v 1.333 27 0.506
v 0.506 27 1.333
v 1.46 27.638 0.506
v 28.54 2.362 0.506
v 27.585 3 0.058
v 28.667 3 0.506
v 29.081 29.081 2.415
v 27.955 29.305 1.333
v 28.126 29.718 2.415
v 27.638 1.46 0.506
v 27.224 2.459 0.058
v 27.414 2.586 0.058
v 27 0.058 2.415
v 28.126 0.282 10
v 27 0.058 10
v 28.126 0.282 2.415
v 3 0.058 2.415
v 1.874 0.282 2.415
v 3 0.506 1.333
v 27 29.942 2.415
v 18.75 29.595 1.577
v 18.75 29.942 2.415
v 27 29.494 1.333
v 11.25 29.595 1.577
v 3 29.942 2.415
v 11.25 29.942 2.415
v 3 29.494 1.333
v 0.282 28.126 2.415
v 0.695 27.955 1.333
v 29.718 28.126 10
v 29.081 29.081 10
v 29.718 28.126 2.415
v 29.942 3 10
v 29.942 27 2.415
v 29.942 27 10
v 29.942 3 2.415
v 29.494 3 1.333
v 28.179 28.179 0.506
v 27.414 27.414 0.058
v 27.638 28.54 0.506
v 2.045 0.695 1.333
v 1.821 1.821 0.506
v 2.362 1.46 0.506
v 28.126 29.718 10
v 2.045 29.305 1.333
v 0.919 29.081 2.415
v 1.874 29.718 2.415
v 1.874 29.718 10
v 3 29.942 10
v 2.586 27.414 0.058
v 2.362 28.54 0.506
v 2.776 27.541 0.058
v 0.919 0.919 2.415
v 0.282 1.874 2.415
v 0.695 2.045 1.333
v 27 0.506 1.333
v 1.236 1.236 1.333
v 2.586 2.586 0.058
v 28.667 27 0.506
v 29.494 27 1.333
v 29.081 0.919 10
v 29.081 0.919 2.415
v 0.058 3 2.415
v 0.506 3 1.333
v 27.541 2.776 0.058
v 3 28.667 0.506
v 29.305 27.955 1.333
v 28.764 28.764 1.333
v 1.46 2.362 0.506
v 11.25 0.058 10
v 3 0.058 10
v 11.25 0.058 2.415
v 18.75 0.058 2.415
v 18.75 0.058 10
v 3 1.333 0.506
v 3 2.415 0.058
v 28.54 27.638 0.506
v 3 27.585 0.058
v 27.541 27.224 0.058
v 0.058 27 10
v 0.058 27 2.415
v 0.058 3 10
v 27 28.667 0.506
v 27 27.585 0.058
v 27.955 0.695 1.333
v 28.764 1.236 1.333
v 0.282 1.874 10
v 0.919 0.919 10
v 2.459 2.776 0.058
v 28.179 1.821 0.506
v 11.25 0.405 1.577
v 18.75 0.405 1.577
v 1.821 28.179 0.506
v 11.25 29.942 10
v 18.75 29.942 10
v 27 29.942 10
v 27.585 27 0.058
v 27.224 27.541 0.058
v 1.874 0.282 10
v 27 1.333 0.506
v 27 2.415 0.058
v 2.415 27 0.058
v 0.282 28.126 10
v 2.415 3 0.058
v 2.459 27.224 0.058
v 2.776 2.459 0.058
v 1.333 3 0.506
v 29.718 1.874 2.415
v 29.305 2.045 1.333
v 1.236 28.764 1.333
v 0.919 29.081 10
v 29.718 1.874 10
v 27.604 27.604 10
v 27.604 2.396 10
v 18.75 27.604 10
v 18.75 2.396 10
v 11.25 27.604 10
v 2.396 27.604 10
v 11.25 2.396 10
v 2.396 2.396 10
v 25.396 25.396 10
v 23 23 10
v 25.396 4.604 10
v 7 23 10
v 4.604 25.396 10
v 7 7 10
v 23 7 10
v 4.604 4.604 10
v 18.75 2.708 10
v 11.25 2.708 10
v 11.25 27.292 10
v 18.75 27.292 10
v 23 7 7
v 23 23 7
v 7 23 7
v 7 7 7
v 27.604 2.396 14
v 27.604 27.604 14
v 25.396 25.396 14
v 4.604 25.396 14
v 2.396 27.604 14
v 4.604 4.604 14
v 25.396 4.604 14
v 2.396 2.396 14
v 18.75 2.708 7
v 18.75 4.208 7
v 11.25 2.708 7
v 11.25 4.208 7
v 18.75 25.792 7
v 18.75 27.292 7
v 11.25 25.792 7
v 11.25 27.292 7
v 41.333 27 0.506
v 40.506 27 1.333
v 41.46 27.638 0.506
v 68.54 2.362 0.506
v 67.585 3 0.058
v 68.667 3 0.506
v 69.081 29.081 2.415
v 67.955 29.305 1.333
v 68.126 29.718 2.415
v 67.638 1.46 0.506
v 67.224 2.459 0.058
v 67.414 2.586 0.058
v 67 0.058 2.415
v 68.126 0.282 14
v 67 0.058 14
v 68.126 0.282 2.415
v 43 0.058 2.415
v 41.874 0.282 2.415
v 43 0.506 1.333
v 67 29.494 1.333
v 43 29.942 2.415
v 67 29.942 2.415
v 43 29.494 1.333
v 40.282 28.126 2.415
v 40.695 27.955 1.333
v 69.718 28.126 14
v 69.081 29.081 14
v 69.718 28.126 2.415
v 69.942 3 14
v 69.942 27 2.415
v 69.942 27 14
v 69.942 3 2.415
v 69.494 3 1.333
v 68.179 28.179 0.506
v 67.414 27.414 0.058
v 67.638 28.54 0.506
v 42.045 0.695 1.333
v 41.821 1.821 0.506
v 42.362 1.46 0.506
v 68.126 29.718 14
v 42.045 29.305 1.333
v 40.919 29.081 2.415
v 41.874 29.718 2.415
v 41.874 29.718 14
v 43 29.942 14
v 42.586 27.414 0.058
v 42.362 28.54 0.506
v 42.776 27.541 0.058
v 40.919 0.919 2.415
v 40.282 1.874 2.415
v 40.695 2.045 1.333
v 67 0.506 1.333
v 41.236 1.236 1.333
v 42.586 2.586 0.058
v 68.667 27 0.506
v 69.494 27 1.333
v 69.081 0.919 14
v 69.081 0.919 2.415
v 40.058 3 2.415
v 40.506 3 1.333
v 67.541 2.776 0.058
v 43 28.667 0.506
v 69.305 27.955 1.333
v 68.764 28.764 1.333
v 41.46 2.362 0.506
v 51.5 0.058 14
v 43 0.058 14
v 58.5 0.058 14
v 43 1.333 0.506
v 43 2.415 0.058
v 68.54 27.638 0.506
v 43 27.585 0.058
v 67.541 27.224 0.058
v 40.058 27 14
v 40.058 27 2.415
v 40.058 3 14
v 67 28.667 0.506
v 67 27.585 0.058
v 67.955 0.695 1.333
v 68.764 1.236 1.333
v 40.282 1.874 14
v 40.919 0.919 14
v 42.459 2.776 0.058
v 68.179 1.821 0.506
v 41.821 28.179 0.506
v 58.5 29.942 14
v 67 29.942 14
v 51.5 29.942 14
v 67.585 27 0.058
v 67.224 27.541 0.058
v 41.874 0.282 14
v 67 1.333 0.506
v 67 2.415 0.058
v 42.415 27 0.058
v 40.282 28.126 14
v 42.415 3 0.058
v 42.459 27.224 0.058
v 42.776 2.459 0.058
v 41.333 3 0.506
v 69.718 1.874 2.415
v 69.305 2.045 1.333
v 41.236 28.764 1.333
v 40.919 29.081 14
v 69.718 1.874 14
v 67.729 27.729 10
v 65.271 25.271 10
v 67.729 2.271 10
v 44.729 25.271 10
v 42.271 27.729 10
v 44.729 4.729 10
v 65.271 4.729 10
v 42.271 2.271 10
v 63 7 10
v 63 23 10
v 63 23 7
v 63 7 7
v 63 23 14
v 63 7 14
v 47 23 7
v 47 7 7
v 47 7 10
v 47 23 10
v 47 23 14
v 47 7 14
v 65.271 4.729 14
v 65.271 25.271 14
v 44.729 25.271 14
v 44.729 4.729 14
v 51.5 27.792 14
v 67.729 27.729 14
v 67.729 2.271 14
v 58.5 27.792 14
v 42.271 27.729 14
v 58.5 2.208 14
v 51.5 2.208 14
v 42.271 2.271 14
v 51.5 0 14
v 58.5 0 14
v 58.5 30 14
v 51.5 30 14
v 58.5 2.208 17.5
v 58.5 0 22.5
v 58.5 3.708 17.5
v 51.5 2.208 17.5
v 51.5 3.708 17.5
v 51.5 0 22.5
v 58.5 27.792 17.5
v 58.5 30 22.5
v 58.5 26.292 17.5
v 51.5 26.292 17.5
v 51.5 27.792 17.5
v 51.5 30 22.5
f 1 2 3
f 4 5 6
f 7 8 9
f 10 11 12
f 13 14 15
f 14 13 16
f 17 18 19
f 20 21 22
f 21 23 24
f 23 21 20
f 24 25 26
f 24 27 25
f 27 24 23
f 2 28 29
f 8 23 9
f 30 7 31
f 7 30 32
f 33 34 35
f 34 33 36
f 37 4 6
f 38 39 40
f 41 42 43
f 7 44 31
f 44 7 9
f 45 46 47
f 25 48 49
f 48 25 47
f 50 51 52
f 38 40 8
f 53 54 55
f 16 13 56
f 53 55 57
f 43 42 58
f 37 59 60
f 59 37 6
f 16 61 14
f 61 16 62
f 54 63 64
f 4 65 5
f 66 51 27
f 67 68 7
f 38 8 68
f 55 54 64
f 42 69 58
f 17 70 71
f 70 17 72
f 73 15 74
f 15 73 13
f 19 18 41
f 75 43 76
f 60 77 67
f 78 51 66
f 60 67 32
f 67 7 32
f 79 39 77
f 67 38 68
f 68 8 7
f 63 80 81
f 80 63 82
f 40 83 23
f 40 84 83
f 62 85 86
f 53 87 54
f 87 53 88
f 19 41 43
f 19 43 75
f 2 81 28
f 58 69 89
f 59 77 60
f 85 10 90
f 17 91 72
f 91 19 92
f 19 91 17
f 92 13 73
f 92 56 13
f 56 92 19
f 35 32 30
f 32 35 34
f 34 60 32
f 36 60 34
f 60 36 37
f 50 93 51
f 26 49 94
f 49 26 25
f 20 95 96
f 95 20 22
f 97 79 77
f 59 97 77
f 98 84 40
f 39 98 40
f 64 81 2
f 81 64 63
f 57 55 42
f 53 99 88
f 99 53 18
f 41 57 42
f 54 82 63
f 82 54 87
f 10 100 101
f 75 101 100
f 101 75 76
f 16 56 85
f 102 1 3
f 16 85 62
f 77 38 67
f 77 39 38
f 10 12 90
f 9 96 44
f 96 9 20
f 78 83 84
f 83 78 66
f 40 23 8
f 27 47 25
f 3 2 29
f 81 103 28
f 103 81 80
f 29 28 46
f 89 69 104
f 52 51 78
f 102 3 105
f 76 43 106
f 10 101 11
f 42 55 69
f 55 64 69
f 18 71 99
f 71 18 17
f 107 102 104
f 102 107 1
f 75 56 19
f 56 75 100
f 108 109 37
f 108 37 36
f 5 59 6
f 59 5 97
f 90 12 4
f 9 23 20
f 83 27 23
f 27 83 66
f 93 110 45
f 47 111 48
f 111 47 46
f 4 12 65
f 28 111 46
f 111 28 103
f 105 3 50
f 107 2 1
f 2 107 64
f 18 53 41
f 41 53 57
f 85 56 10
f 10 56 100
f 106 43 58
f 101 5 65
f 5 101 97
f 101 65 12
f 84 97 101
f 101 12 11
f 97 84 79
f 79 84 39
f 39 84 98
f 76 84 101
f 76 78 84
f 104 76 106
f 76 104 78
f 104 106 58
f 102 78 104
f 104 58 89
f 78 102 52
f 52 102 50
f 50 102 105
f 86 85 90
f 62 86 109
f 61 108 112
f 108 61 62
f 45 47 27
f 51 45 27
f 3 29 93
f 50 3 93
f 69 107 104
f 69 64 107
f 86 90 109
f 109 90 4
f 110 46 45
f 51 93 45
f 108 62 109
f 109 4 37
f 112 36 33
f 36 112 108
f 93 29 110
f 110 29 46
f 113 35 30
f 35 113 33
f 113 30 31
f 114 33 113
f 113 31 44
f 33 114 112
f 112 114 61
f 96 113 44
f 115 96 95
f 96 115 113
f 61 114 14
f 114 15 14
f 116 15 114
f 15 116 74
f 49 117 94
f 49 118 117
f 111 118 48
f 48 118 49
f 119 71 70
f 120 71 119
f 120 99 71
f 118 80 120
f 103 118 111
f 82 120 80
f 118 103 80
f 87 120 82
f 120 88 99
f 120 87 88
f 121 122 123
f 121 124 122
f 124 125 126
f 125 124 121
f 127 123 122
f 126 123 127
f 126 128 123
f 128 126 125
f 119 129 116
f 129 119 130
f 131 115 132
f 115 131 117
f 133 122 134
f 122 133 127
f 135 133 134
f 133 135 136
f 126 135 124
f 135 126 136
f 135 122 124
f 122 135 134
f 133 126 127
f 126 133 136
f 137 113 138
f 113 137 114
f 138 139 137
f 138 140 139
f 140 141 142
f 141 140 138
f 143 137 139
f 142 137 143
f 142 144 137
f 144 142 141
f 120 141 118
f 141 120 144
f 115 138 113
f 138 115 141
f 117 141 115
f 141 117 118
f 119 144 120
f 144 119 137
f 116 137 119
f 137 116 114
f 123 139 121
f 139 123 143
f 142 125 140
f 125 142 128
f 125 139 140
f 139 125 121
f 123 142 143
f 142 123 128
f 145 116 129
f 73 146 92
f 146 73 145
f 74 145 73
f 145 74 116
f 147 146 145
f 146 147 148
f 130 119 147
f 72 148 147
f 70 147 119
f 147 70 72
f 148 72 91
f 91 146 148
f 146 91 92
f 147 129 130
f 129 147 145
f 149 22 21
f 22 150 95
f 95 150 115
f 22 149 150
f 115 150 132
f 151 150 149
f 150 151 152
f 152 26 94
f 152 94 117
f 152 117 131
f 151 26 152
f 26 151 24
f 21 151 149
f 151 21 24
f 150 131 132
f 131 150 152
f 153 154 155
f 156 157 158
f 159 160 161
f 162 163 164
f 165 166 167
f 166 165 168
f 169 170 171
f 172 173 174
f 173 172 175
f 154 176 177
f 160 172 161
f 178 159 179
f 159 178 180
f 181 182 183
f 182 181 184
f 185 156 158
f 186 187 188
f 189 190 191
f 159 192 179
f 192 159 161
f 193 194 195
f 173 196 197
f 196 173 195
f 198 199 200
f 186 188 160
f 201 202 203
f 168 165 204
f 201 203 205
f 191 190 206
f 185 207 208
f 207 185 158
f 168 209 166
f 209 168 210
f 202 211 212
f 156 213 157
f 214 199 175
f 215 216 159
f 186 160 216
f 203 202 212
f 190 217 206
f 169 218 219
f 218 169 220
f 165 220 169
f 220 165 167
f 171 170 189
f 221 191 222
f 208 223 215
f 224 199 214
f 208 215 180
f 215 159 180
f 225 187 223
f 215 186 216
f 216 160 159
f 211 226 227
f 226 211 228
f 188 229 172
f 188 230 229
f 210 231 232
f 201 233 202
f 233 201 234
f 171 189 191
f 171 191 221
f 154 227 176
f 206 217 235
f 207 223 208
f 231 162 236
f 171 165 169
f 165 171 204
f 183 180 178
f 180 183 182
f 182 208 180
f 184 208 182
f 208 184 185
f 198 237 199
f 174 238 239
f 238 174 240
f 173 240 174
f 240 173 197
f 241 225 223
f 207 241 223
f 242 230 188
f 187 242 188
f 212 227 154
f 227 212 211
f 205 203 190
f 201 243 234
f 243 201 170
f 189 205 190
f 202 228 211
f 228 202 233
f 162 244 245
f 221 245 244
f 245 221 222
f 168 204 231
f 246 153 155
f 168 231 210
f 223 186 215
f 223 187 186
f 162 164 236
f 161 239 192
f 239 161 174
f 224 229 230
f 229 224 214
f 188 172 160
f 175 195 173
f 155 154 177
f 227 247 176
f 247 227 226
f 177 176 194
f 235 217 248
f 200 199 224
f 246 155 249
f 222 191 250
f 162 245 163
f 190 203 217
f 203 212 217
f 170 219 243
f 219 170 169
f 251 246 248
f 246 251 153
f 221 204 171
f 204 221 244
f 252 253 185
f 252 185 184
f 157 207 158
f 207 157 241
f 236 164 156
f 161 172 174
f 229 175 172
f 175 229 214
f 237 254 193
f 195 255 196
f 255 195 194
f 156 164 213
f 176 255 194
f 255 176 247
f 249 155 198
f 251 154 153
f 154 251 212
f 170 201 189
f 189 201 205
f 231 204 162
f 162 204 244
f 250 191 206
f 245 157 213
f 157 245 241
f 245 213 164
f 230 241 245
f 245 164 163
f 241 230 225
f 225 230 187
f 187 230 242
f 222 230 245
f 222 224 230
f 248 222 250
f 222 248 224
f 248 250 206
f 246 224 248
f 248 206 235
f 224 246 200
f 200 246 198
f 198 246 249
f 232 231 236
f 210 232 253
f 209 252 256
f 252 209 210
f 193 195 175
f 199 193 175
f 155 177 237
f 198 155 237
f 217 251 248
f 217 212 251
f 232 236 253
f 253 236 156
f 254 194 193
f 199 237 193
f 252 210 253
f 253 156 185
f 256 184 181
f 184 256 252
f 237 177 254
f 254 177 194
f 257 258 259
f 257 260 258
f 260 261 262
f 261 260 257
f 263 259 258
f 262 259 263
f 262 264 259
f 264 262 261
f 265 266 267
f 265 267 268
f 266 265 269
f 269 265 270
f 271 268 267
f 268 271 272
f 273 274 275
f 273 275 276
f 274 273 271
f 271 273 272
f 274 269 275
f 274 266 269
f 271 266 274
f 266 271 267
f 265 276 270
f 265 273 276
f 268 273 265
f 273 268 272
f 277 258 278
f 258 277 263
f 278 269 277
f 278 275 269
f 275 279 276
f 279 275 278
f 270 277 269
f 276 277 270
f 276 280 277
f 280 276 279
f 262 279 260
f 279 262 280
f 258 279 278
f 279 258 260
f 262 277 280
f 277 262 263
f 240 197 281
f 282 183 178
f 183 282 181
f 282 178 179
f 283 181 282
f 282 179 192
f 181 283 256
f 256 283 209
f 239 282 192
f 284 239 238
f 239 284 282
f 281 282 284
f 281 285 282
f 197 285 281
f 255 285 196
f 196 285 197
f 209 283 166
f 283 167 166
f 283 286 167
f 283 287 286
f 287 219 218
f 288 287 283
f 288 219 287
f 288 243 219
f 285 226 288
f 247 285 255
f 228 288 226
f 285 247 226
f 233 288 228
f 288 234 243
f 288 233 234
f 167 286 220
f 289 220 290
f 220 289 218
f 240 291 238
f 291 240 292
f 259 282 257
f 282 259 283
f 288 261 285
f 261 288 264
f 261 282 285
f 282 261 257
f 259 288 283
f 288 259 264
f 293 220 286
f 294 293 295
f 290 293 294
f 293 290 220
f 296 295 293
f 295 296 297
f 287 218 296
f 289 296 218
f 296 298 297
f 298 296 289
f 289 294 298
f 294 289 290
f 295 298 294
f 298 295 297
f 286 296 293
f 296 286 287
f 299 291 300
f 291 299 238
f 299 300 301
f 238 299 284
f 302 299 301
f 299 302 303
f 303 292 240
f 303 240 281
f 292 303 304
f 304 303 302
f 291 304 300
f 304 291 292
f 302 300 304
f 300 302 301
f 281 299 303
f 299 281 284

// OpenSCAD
// file: interlocking_box.scad
////////////////////////////////////////////////////////////////////////////////
// Rounded cube things
////////////////////////////////////////////////////////////////////////////////

DISABLE_ROUND_CUBE = false;

module round_cube(s, rs) {
	if (DISABLE_ROUND_CUBE) {
		cube(s);
	} else {
		hull() {
			for (x = [rs[0], s[0]-rs[0]]) {
				for (y = [rs[1], s[1]-rs[1]]) {
					for (z = [rs[2], s[2]-rs[1]]) {
						translate([x,y,z])
							scale([rs[0]/5, rs[1]/5, rs[2]/5])
								sphere(r = 5);
					}
				}
			}
		}
	}
}


////////////////////////////////////////////////////////////////////////////////
// Halves of a hollow container
////////////////////////////////////////////////////////////////////////////////

// size: The size of the box [w,h,t]
// wall_thickness: Thicknesses of the walls of the box
// joint_size: The size of the joint
// joint_tollerance: Size of a gap added as extra around the join.
// female: Is this the female part of the box?
// radius: The radius of the rounding of the corners
module box_half(size, wall_thickness, joint_size, joint_tollerance, female, radius) {
	// Half is in the top, half in the bottom
	joint_tollerance = joint_tollerance / 2;
	
	union() {
		// The box itself
		difference() {
			round_cube([size[0], size[1], size[2]+radius], [radius,radius, radius]);
			
			// Chop the rounded corners off
			translate([0,0,size[2]])
				cube([size[0], size[1], radius]);
			
			
			// Hollow out the inside
			translate([wall_thickness, wall_thickness, wall_thickness])
				cube([ size[0] - (wall_thickness*2)
				     , size[1] - (wall_thickness*2)
				     , size[2]
				     ]);
		}
		
		// Create the joint
		if (!female) {
			difference() {
				translate([wall_thickness/3 + joint_tollerance/4, wall_thickness/3 + joint_tollerance/4, size[2]])
					cube([ size[0] - (2*(wall_thickness/3)) - joint_tollerance/2
					     , size[1] - (2*(wall_thickness/3)) - joint_tollerance/2
					     , joint_size
					     ]);
				
				translate([2*(wall_thickness/3) - joint_tollerance/4, 2*(wall_thickness/3) - joint_tollerance/4, size[2] - 1])
					cube([ size[0] - (4*(wall_thickness/3)) + joint_tollerance/2
					     , size[1] - (4*(wall_thickness/3)) + joint_tollerance/2
					     , joint_size + 2
					     ]);
			}
		} else {
			union() {
				// Inner lip
				difference() {
					translate([2*(wall_thickness/3) + joint_tollerance/4, 2*(wall_thickness/3) + joint_tollerance/4, size[2]])
						cube([ size[0] - (4*(wall_thickness/3)) - joint_tollerance/2
						     , size[1] - (4*(wall_thickness/3)) - joint_tollerance/2
						     , joint_size
						     ]);
					
					translate([wall_thickness, wall_thickness, size[2] - 1])
						cube([ size[0] - 2*wall_thickness
						     , size[1] - 2*wall_thickness
						     , joint_size + 2
						     ]);
					
				}
				
				// Outer Lip
				difference() {
					intersection() {
						translate([0,0,size[2]-radius])
							round_cube([size[0],size[1],joint_size+(radius*2)], [radius,radius,radius]);
						translate([0,0,size[2]])
							cube([size[0],size[1],joint_size]);
					}
					
					translate([wall_thickness/3 - joint_tollerance/4, wall_thickness/3 - joint_tollerance/4, size[2]-1])
						cube([ size[0] - (2*(wall_thickness/3))  + joint_tollerance/2
						     , size[1] - (2*(wall_thickness/3))  + joint_tollerance/2
						     , joint_size + 2
						     ]);
				}
			}
		}
	}
}

//translate([0,0,0])
//	box_half(size = [30,30,10], wall_thickness = 5, joint_size = 4, joint_tollerance = 0.5, female = false, radius = 3);
//translate([40,0,0])
//	box_half(size = [30,30,10], wall_thickness = 5, joint_size = 4, joint_tollerance = 0.5, female = true, radius = 3);
// main file
include <interlocking_box.scad>;

////////////////////////////////////////////////////////////////////////////////
// Clips and their cutout
////////////////////////////////////////////////////////////////////////////////

// width: The width of the clip
// thickness: The thickness of the shaft
// shaft_length: The length of the straight section of the clip
// clip_length: The length of the angled clip section (additional to the shaft_length)
// clip_protrusion: The distance the point of the clip sticks out from the shaft.
// clip_tollerance: The additional space added around a clip to account for manufacturing errors.
module clip(width, thickness, shaft_length, clip_length, clip_protrusion, clip_tollerance) {
	width = width + clip_tollerance;
	translate([-clip_tollerance/2, 0,0])
		union() {
			// Shaft
			cube([width, thickness + clip_tollerance, shaft_length - clip_tollerance]);
			
			// Clip
			translate([0,0,shaft_length - clip_tollerance]) {
				difference() {
					cube([width, thickness + clip_protrusion + clip_tollerance, clip_length + 2*clip_tollerance]);
				
					translate([-1,0,clip_length + clip_tollerance*2])
						rotate(a=[-atan((clip_length+2*clip_tollerance)/(thickness + clip_protrusion + clip_tollerance)),0,0])
							cube([width+2, sqrt(pow(thickness + clip_protrusion + clip_tollerance, 2) + pow(clip_length + 2*clip_tollerance,2)), clip_length]);
				}
			}
		}
}


size = [30,30,10];
wall_thickness = 7;
joint_size = 4;
joint_tollerance = 0.5;
radius = 3;
clip_thickness = (wall_thickness/3) - (joint_tollerance/4);
shaft_length = 3.5;
clip_length = 5;
clip_protrusion = 1.5;
clip_width = 7;
pos_clip_tollerance = 0.0;
neg_clip_tollerance = 0.5;

translate([0,0,0]) {
	difference() {
		box_half( size = size, wall_thickness = wall_thickness
		        , joint_size = joint_size, joint_tollerance = joint_tollerance
		        , female = false, radius = radius
		        );
		// Left clip
		translate([(size[0]/2) - (clip_width/2),0, size[2]])
			mirror([0,0,1])
				clip( width = clip_width, thickness = clip_thickness
				    , shaft_length = shaft_length, clip_length = clip_length
				    , clip_protrusion = clip_protrusion, clip_tollerance = neg_clip_tollerance);
		// Right clip
		translate([(size[0]/2) - (clip_width/2), size[1], size[2]])
			mirror([0,0,1])
			mirror([0,1,0])
				clip( width = clip_width, thickness = clip_thickness
				    , shaft_length = shaft_length, clip_length = clip_length
				    , clip_protrusion = clip_protrusion, clip_tollerance = neg_clip_tollerance);
	}
}

translate([40,0,0]) {
	union() {
		box_half( size = size, wall_thickness = wall_thickness
		        , joint_size = joint_size, joint_tollerance = joint_tollerance
		        , female = true, radius = radius
		        );
		// Left clip
		translate([(size[0]/2) - (clip_width/2),0, size[2] + joint_size])
			clip( width = clip_width, thickness = clip_thickness
			    , shaft_length = shaft_length, clip_length = clip_length
			    , clip_protrusion = clip_protrusion, clip_tollerance = pos_clip_tollerance);
		// Right clip
		translate([(size[0]/2) - (clip_width/2), size[1], size[2] + joint_size])
			mirror([0,1,0])
				clip( width = clip_width, thickness = clip_thickness
				    , shaft_length = shaft_length, clip_length = clip_length
				    , clip_protrusion = clip_protrusion, clip_tollerance = pos_clip_tollerance);
	}
}
